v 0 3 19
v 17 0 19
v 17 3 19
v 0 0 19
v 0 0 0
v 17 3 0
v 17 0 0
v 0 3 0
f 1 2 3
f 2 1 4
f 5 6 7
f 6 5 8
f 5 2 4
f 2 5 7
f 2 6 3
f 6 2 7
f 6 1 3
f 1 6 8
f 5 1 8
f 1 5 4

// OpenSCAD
// Generated by SolidPython 1.0.1 on 2020-07-29 00:46:56


cube(size = [17, 3, 19]);
/***********************************************
*********      SolidPython code:      **********
************************************************
 
# import packages: SolidPython
from solid import *
from solid.utils import *
from itertools import chain, combinations, permutations


class Resize:

    def __init__(self, scad_file):
        self.scad_file = scad_file
        #self.scad_file = import_scad(scad_file)
        # cone/cylinder param:
        self.r1 = 0
        self.r2 = 0
        self.h = 0
        # rectangular prism param:
        self.w = 0
        self.l = 0
        # ellipse param:
        self.r = 0

    # import OpenScad code (file name corresponds to shape)


    # classify shape + parameters
    def assign(self, param1, param2, param3):
        if self.scad_file == 'cone.scad':
            self.r1 = param1
            self.r2 = param2
            self.h = param3
        elif self.scad_file == 'cylinder.scad':
            self.r1 = param1
            self.r2 = param2
            self.h = param3
        elif self.scad_file == 'rectangularPrism.scad':
            self.h = param1
            self.l = param2
            self.w = param3
        else:
            self.r = param1
            self.h = param2

    # resize parameters
    def iterate(self):
        x = range(3, 20, 2)
        i = 1
        if self.scad_file == 'cone.scad':
            tempList = list(permutations(x, 2))
            for temp in tempList:
                param1 = temp[0]
                param2 = temp[1]
                filepath = 'produced_scad_files/' + 'cone' + str(param1) + '_' + str(param2) + '_' + '.scad'
                scad_render_to_file(cylinder(h=param1, r1=param2, r2=0), filepath)

        elif self.scad_file == 'cylinder.scad':
            tempList = list(permutations(x, 3))
            for temp in tempList:
                param1 = temp[0]
                param2 = temp[1]
                filepath = 'produced_scad_files/' + 'cylinder' + str(param1) + '_' + str(param2) + '_' + '.scad'
                scad_render_to_file(cylinder(h=param1, r1=param2, r2=param2), filepath)

        elif self.scad_file == 'rectangularPrism.scad':
            tempList = list(permutations(x, 3))
            for temp in tempList:
                param1 = temp[0]
                param2 = temp[1]
                param3 = temp[2]
                filepath = 'produced_scad_files/' + 'rectangularPrism' + str(param1) + '_' + str(param2) + '_' + str(
                    param3) + '.scad'
                scad_render_to_file(cube(size=(param1, param2, param3)), filepath)

        elif self.scad_file == 'ellipse.scad':
            tempList = list(permutations(x, 4))
            for temp in tempList:
                param1 = temp[0]
                param2 = temp[1]
                param3 = temp[2]
                param4 = temp[3]
                filepath = 'produced_scad_files/' + 'ellipse' + str(param1) + '_' + str(param2) + '_' + str(param3) + '_' + str(param4) + '.scad'
                scad_render_to_file(scale([param1, param2, param3])(sphere(r=param4)), filepath)

    def render_to_scadfile(self):
        scad_render_to_file(scad, 'example.scad') 
 
************************************************/
